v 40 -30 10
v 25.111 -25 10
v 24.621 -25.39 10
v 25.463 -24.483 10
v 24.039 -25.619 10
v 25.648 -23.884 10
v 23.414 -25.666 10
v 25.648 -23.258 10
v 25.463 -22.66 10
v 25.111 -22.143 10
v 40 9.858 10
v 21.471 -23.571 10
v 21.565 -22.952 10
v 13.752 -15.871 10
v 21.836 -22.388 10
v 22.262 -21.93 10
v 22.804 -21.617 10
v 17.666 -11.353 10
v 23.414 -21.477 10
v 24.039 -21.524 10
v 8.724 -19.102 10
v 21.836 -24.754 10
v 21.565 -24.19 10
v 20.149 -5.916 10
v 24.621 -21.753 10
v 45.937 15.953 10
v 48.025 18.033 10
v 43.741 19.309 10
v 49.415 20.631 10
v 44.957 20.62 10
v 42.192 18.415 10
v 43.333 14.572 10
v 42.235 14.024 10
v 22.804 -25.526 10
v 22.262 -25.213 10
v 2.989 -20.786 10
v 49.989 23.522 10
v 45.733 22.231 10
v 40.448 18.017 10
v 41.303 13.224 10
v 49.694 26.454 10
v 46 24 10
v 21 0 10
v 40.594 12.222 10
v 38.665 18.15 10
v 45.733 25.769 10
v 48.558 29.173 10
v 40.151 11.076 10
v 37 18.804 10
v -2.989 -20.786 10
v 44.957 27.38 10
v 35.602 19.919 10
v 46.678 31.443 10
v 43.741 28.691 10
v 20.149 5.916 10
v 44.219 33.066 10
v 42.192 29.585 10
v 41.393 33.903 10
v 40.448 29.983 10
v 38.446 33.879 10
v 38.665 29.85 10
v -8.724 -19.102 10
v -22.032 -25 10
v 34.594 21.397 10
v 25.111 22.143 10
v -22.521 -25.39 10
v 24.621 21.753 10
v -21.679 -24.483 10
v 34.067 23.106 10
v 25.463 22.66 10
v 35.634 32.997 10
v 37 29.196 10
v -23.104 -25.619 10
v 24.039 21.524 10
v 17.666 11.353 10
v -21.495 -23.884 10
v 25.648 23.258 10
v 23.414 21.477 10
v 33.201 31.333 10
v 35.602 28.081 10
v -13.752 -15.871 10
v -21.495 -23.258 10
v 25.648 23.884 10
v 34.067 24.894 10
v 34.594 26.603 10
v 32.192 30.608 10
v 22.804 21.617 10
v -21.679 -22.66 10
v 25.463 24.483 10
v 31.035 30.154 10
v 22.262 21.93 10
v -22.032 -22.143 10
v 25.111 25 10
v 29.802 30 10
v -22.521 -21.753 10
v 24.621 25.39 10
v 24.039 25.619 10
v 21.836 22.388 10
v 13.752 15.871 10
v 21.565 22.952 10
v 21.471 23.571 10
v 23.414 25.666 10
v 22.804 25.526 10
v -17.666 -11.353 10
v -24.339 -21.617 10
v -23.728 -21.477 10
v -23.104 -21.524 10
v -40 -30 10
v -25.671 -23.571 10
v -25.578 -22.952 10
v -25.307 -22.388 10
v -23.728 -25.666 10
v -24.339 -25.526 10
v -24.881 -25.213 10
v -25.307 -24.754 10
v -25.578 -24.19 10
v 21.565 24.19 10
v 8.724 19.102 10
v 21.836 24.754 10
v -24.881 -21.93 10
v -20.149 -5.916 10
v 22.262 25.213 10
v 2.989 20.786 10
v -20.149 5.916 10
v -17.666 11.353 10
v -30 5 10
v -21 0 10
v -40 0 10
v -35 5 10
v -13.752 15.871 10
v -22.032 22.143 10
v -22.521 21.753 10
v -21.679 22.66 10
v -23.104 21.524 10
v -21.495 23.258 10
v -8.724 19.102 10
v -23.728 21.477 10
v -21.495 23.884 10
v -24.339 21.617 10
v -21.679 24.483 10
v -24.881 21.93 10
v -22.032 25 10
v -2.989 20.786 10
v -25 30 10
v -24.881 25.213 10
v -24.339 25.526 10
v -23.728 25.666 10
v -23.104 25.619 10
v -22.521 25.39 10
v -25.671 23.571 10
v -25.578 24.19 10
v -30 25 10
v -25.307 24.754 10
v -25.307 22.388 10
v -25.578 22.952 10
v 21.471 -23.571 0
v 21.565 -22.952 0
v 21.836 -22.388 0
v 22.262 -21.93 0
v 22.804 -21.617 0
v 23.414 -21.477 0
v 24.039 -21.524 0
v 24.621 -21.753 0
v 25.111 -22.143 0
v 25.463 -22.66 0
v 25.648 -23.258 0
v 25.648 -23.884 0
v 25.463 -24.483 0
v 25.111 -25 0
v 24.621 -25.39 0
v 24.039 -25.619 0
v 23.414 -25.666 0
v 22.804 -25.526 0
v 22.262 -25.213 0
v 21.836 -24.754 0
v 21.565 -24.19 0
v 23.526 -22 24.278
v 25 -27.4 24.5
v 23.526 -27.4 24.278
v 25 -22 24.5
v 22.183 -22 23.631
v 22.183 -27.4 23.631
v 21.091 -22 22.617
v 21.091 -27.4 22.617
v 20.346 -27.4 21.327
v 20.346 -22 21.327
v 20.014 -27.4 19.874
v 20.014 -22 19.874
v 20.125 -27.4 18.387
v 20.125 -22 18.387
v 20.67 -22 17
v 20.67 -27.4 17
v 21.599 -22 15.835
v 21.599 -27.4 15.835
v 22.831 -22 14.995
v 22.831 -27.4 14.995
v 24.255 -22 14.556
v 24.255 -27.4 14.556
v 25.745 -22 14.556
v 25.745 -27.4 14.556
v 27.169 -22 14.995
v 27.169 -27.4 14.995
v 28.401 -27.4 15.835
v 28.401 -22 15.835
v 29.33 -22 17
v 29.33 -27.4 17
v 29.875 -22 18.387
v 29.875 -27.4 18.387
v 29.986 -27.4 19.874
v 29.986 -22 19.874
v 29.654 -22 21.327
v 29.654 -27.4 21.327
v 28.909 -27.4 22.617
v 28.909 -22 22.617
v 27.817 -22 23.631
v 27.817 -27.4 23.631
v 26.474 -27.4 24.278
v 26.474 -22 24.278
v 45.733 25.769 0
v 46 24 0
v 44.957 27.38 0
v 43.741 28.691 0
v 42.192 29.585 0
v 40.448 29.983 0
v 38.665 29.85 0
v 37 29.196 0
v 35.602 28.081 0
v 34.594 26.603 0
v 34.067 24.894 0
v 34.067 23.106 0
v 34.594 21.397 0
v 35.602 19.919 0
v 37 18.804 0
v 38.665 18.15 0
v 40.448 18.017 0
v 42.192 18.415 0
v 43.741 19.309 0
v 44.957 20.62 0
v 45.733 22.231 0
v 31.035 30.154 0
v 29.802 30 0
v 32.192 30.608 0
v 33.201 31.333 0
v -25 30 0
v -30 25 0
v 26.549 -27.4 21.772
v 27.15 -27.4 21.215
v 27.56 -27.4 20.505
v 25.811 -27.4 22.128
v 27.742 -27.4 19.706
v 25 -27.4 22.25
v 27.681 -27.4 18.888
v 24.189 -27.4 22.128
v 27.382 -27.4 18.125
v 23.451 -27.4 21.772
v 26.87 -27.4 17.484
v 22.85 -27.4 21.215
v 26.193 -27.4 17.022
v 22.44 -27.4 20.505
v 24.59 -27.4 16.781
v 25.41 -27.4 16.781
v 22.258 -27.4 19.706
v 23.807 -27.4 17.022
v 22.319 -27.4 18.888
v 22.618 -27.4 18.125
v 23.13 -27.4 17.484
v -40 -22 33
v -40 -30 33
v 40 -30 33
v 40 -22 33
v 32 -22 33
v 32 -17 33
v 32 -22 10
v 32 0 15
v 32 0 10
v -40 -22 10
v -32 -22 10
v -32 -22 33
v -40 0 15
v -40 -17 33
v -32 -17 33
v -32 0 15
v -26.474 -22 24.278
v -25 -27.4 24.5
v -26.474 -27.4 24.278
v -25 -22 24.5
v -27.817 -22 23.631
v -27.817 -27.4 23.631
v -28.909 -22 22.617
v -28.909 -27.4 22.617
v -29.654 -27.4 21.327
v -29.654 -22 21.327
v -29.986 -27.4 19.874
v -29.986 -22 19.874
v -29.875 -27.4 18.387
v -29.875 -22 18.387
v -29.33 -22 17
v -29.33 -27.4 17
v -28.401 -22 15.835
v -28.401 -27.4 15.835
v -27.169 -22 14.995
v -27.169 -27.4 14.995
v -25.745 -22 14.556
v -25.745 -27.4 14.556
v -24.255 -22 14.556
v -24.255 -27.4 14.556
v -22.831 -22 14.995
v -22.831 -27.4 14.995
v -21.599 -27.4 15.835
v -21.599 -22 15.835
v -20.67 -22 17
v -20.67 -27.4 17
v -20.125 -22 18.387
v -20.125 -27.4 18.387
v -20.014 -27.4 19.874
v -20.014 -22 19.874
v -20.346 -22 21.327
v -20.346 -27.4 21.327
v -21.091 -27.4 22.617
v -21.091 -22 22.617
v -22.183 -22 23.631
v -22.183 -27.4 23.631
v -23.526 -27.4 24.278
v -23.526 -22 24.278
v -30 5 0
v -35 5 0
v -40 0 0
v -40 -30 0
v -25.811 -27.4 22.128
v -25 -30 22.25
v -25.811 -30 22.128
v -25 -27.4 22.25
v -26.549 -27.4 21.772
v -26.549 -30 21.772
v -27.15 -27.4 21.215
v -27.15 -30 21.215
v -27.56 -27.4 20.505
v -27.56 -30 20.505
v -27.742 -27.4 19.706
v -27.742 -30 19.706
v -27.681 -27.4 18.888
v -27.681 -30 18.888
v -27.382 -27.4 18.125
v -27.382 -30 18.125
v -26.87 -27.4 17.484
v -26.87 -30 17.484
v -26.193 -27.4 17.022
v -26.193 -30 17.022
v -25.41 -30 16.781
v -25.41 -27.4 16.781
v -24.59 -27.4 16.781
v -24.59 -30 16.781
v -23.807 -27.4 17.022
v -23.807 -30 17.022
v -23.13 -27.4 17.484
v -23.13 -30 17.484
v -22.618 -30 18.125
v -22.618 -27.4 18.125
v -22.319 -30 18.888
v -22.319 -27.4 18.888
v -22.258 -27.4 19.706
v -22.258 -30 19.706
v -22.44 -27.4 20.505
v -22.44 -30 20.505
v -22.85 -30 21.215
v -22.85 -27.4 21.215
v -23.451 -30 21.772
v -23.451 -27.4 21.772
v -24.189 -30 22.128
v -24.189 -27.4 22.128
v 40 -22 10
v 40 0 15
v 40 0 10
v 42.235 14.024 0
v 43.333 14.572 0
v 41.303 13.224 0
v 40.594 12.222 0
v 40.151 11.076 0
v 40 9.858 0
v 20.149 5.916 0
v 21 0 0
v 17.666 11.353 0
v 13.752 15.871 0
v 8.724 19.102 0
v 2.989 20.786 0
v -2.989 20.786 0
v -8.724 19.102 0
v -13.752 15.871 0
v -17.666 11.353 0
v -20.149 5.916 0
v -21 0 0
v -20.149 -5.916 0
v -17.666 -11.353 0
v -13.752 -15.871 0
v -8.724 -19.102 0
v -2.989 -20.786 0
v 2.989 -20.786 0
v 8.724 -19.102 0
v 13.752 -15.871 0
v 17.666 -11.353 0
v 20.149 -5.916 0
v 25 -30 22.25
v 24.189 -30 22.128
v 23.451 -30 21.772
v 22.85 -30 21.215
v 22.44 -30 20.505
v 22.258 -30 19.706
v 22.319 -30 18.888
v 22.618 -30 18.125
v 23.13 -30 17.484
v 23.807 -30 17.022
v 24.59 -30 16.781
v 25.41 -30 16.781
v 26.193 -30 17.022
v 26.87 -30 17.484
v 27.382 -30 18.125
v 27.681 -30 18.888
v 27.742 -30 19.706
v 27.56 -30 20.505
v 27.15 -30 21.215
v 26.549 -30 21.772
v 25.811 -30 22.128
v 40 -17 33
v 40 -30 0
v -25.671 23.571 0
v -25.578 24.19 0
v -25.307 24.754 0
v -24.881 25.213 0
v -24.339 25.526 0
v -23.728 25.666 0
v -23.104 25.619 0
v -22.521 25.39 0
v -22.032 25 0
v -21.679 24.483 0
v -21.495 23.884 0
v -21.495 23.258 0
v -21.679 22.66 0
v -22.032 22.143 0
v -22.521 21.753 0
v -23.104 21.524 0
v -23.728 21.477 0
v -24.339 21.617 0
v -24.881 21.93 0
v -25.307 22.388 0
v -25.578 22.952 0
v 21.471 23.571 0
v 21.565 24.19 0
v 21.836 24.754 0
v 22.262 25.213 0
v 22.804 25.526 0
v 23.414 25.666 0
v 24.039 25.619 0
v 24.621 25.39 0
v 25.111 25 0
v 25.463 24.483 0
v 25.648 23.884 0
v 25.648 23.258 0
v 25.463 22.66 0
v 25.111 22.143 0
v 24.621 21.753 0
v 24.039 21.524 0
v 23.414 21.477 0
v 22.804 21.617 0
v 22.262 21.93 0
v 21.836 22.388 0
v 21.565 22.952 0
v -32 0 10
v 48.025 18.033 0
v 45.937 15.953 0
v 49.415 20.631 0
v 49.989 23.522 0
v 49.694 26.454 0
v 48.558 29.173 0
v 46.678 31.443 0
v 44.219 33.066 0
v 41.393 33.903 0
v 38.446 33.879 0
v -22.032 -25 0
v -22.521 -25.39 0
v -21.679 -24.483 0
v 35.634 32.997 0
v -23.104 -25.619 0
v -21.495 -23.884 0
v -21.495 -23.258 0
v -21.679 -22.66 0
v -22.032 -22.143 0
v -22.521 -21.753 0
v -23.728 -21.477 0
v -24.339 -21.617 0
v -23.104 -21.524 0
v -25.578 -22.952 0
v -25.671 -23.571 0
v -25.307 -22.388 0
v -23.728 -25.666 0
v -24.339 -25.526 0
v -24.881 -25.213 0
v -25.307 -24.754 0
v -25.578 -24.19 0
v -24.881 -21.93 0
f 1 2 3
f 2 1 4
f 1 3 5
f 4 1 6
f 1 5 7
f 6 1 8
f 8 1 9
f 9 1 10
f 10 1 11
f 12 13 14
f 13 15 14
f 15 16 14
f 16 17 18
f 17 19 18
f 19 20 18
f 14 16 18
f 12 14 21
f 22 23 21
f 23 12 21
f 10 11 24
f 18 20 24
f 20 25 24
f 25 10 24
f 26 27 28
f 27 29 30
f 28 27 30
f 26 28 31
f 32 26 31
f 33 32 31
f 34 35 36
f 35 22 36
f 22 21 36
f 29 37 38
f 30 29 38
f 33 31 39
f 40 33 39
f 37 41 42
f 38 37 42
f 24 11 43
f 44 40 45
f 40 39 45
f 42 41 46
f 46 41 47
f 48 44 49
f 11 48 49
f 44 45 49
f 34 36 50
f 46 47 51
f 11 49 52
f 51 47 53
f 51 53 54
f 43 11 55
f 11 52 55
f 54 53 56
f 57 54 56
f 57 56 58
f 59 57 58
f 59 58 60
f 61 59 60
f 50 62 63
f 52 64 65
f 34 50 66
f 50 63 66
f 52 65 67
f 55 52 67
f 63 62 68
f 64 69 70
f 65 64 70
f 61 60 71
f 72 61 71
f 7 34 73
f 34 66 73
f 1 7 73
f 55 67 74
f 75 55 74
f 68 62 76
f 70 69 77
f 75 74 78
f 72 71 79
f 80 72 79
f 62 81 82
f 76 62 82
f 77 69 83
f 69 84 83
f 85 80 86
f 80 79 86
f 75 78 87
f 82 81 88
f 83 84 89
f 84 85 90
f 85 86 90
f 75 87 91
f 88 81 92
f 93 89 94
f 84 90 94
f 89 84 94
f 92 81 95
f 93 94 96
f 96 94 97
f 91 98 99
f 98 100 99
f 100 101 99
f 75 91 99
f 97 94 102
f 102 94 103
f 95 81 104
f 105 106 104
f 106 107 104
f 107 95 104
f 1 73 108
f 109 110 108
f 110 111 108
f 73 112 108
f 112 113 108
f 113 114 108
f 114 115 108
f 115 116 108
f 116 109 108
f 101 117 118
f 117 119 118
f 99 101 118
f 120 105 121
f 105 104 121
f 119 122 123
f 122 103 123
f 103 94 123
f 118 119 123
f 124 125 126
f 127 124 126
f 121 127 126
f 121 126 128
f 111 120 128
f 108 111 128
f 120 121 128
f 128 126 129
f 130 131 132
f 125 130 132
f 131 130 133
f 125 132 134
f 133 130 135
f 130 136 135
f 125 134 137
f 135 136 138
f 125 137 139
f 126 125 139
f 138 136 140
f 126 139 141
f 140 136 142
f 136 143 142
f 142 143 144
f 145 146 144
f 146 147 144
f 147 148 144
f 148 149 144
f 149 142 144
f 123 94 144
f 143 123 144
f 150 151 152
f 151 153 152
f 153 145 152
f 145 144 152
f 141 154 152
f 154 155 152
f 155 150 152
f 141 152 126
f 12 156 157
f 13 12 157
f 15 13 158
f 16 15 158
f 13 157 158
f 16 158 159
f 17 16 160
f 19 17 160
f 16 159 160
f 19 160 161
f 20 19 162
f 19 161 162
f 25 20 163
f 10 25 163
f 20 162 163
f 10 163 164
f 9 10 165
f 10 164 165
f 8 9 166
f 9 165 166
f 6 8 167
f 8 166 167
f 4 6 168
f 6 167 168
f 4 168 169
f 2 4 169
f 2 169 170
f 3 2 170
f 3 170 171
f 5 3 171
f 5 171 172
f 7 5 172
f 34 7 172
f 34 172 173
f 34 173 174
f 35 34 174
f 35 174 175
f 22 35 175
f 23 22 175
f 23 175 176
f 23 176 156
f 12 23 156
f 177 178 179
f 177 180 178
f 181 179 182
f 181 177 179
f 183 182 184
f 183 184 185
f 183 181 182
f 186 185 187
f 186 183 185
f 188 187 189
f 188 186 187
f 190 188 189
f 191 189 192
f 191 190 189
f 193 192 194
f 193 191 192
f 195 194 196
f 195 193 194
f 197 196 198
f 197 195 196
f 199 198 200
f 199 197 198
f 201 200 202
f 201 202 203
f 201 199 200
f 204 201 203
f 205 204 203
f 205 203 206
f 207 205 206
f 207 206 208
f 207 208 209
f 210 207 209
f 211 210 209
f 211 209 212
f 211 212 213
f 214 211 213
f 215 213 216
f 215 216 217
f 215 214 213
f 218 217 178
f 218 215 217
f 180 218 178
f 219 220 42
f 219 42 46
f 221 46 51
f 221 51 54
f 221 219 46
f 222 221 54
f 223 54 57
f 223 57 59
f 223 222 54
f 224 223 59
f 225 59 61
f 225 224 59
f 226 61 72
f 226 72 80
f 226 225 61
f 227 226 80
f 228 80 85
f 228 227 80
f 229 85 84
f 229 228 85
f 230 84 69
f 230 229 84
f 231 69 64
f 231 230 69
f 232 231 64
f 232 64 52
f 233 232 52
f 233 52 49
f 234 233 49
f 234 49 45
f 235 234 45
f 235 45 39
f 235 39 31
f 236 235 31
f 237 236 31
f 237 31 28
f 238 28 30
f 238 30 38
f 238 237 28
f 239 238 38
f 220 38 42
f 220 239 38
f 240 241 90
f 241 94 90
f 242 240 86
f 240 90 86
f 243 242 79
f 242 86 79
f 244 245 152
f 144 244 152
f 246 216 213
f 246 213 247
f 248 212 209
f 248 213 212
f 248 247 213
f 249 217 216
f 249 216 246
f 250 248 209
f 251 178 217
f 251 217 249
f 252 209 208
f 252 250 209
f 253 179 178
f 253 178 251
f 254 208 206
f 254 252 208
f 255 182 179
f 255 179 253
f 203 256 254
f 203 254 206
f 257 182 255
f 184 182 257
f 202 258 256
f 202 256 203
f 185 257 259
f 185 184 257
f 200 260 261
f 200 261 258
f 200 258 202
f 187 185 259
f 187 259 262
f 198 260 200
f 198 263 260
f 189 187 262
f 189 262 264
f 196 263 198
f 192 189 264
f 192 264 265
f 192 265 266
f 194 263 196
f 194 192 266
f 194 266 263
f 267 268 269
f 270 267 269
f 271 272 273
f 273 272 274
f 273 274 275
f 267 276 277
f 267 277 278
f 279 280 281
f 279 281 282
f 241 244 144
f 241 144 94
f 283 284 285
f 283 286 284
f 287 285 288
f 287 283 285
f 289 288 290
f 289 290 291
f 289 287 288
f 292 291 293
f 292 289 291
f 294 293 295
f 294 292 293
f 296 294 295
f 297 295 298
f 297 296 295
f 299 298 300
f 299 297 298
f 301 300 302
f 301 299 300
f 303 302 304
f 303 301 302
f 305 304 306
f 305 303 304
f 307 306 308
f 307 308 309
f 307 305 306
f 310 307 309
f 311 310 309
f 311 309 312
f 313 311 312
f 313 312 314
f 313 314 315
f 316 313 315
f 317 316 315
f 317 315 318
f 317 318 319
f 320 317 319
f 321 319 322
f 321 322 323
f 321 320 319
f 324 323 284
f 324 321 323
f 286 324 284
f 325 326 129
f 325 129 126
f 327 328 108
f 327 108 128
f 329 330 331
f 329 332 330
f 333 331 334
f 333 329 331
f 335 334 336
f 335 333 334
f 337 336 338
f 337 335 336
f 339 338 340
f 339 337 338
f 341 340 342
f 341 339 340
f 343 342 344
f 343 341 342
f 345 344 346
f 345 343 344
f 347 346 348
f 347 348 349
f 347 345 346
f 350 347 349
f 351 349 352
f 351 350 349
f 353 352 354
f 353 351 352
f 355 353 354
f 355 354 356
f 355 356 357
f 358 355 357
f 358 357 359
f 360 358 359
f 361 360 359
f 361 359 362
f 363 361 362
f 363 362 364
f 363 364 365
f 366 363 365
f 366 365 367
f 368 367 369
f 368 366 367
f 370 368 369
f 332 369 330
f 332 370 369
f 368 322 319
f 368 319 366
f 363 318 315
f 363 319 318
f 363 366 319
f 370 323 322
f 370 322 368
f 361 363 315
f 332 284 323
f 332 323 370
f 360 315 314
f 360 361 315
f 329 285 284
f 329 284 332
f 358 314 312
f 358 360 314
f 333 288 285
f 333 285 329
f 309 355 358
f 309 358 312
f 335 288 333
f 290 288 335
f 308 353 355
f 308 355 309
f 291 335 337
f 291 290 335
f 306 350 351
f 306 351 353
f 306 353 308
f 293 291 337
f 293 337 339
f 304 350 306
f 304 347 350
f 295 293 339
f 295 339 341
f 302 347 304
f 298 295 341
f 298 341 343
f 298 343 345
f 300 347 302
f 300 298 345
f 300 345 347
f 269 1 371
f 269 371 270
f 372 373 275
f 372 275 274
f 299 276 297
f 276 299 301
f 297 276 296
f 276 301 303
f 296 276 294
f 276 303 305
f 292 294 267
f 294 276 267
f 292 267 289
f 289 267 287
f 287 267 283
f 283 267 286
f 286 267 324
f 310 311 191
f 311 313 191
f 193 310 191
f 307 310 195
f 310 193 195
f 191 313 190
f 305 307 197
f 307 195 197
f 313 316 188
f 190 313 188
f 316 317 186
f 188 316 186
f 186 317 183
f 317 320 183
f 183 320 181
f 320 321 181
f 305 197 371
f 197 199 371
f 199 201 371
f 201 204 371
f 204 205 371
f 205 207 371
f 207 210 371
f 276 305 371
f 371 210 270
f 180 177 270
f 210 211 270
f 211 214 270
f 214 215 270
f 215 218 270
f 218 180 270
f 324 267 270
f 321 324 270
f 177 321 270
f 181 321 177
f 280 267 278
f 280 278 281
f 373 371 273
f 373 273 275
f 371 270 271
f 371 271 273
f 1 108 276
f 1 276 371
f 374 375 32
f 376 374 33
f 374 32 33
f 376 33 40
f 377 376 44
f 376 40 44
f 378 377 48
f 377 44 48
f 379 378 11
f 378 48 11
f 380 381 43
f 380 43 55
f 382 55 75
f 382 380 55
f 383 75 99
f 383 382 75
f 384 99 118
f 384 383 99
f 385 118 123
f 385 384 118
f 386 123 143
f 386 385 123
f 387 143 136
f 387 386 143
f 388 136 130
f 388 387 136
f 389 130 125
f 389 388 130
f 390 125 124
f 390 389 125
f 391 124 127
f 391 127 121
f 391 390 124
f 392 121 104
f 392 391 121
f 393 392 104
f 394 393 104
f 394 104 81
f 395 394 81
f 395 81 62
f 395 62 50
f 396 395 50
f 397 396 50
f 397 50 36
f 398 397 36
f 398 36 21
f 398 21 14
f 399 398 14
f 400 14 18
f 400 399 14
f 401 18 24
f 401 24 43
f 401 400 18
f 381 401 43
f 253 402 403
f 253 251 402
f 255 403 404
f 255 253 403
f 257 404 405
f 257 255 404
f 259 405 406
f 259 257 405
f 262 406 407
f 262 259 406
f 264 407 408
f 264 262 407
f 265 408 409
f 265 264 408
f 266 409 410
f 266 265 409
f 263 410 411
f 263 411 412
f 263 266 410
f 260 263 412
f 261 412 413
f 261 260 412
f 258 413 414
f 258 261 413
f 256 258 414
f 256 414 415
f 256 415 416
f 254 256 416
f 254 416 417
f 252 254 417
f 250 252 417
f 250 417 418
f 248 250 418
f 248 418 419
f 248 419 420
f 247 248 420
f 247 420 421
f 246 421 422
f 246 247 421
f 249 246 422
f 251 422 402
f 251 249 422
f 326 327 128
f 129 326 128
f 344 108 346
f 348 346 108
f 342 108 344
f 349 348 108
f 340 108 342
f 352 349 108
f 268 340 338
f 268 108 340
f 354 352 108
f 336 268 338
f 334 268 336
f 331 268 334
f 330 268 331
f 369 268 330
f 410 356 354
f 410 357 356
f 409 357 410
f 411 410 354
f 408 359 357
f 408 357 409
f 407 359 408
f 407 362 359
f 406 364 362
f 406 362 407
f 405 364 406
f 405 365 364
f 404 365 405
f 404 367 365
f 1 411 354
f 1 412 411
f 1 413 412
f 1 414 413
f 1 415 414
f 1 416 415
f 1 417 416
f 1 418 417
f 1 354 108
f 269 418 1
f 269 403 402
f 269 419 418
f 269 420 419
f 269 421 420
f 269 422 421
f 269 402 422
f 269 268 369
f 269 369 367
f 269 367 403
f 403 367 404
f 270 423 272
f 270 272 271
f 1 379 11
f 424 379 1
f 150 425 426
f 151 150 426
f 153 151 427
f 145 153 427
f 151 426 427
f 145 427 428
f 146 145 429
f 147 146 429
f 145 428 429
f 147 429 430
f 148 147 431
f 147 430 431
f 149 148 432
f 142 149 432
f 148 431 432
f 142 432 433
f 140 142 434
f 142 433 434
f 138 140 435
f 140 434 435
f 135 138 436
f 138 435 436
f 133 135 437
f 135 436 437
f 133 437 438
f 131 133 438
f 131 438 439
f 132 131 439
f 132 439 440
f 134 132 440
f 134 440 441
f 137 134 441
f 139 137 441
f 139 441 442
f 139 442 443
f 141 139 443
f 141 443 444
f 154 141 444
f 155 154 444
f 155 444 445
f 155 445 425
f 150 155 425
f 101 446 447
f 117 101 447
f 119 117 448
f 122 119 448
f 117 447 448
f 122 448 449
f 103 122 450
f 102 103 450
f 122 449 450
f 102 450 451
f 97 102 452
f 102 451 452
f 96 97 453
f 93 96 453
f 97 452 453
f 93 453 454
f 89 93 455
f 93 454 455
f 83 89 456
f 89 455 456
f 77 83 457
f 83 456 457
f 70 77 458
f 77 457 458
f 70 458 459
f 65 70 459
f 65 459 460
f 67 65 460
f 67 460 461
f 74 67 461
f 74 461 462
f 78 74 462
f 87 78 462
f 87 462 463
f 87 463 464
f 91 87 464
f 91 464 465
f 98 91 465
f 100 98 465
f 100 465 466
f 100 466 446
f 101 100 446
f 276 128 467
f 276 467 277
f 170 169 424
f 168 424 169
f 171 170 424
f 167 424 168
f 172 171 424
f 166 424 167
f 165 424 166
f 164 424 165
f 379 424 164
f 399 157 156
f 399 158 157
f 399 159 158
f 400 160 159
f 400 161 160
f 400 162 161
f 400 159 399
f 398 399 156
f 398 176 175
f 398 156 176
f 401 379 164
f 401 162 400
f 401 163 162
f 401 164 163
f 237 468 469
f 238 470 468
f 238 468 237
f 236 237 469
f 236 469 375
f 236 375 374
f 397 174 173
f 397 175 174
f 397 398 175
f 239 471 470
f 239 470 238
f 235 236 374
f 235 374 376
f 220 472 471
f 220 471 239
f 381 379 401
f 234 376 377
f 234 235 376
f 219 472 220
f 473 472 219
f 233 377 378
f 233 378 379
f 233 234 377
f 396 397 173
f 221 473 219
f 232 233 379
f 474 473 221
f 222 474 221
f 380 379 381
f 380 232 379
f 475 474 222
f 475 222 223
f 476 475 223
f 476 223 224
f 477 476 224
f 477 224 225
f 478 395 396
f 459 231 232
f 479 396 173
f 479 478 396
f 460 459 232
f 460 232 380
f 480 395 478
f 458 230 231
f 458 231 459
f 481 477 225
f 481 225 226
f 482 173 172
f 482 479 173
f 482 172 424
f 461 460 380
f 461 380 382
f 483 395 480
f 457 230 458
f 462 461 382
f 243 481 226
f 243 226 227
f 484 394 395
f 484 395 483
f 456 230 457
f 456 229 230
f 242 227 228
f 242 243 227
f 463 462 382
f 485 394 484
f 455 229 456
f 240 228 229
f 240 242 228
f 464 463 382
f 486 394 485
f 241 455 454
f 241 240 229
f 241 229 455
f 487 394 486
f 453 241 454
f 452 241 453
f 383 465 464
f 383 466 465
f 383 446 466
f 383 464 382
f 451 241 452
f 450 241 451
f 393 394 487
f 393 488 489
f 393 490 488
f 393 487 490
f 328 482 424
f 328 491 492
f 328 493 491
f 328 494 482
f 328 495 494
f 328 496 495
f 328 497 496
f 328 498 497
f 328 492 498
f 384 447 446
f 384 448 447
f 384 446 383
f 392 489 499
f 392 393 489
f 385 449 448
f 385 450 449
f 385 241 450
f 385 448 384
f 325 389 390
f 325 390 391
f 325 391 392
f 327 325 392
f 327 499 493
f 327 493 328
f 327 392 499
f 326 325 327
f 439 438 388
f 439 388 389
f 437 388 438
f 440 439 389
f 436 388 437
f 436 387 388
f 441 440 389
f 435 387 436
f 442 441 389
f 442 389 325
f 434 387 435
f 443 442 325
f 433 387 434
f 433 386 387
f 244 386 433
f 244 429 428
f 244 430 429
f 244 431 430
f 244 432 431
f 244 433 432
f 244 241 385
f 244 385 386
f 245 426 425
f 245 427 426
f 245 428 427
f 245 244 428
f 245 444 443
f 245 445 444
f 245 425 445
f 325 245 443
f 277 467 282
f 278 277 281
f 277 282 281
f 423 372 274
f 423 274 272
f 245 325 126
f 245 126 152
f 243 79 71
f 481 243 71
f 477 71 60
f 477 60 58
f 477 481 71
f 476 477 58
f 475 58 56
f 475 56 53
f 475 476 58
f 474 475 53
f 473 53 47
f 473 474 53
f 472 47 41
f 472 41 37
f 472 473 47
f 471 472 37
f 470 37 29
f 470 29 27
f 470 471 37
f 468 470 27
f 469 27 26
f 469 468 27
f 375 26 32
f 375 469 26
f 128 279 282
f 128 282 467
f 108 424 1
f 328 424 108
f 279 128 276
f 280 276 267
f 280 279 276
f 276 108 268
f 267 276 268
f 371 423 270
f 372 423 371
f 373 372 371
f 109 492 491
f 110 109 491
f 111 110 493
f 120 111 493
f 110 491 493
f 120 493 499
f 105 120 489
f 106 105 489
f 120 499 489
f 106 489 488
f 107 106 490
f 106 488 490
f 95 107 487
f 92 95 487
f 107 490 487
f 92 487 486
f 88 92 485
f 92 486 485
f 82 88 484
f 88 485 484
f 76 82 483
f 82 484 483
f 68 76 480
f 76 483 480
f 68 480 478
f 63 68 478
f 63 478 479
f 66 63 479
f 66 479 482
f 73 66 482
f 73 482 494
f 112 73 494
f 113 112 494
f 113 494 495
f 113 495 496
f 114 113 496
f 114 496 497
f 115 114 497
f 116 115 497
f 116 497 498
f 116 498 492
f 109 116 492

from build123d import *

# Parameters (mm, degrees)
SKETCH1_R                                    = 21
SKETCH1_R_2                                  = 6
EXTRUDE1_DEPTH                               = 10
M5_TAPPED_HOLE1_D                            = 4.2
SKETCH6_W                                    = 80
SKETCH6_H                                    = 23
EXTRUDE2_DEPTH                               = 8
CHAMFER1_SIZE                                = 5
EXTRUDE3_DEPTH                               = 8
EXTRUDE4_DEPTH                               = 8
CBORE_FOR_M5_HEX_SOCKET_HEAD_CAP_SCR_2_COUNT = 2
CBORE_FOR_M5_HEX_SOCKET_HEAD_CAP_SCR_2_PITCH = 50
FILLET1_R                                    = 5


with BuildPart() as part:
    # Sketch1 → Extrude1 (new body)
    with BuildSketch(Plane.XY):
        with BuildLine():
            Line((-30, 30), (32, 30))
            ThreePointArc((32, 30), (48.94427191, 28.472135955), (40, 14))
            Line((40, 14), (40, -30))
            Line((40, -30), (-40, -30))
            Line((-40, -30), (-40, 5))
            Line((-40, 5), (-30, 5))
            Line((-30, 5), (-30, 30))
        make_face()
        Circle(SKETCH1_R, mode=Mode.SUBTRACT)
        with Locations((40, 24)):
            Circle(SKETCH1_R_2, mode=Mode.SUBTRACT)
    extrude(amount=EXTRUDE1_DEPTH)

    # M5 Tapped Hole1 (through all)
    with Locations(Plane.XY.offset(10)):
        with Locations((-23.571404551, 23.571404551), (23.571404551, 23.571404551), (23.571404551, -23.571404551), (-23.571404551, -23.571404551)):
            Hole(M5_TAPPED_HOLE1_D / 2)

    # Chamfer1
    chamfer1_edges = [part.edges().sort_by_distance(p)[0] for p in [
        (-30, 30, 5),
        (-40, 5, 5),
    ]]
    chamfer(chamfer1_edges, length=CHAMFER1_SIZE)

    # Fillet1
    fillet1_edges = [part.edges().sort_by_distance(p)[0] for p in [
        (32, 30, 5),
        (40, 14, 5),
    ]]
    fillet(fillet1_edges, radius=FILLET1_R)


with BuildPart() as body_2:
    # Sketch6 → Extrude2 (new body)
    with BuildSketch(Plane.XZ.offset(30)):
        with Locations((0, 21.5)):
            Rectangle(SKETCH6_W, SKETCH6_H)
    extrude(amount=-EXTRUDE2_DEPTH)

    # Sketch10 → CBORE for M5 Hex Socket Head Cap Screw1 (revolve, cut)
    with BuildSketch(Plane(origin=(25, -22, 19.5), x_dir=(0, 0, 1), z_dir=(1, 0, 0))):
        Polygon((0, 0), (0, 8), (2.75, 8), (2.75, 5.4), (5, 5.4), (5, 0), align=None)
    cbore_for_m5_hex_socket_head_cap_screw1 = revolve(axis=Axis((25, -15.65, 19.5), (0, -1, 0)), mode=Mode.SUBTRACT)

    # CBORE for M5 Hex Socket Head Cap Scr 2: CBORE for M5 Hex Socket Head Cap Screw1 ×2
    with Locations(*[(-i * CBORE_FOR_M5_HEX_SOCKET_HEAD_CAP_SCR_2_PITCH, 0, 0) for i in range(1, CBORE_FOR_M5_HEX_SOCKET_HEAD_CAP_SCR_2_COUNT)]):
        add(cbore_for_m5_hex_socket_head_cap_screw1, mode=Mode.SUBTRACT)


with BuildPart() as body_3:
    # Sketch7 → Extrude3 (new body)
    with BuildSketch(Plane(origin=(40, 0, 0), x_dir=(0, 0, -1), z_dir=(1, 0, 0))):
        Polygon((-10, 0), (-15, 0), (-33, -17), (-33, -22), (-10, -22), align=None)
    extrude(amount=-EXTRUDE3_DEPTH)


with BuildPart() as body_4:
    # Sketch8 → Extrude4 (new body)
    with BuildSketch(Plane.ZY.offset(40)):
        Polygon((15, 0), (10, 0), (10, -22), (33, -22), (33, -17), align=None)
    extrude(amount=-EXTRUDE4_DEPTH)


solid = Compound([part.part, body_2.part, body_3.part, body_4.part])
